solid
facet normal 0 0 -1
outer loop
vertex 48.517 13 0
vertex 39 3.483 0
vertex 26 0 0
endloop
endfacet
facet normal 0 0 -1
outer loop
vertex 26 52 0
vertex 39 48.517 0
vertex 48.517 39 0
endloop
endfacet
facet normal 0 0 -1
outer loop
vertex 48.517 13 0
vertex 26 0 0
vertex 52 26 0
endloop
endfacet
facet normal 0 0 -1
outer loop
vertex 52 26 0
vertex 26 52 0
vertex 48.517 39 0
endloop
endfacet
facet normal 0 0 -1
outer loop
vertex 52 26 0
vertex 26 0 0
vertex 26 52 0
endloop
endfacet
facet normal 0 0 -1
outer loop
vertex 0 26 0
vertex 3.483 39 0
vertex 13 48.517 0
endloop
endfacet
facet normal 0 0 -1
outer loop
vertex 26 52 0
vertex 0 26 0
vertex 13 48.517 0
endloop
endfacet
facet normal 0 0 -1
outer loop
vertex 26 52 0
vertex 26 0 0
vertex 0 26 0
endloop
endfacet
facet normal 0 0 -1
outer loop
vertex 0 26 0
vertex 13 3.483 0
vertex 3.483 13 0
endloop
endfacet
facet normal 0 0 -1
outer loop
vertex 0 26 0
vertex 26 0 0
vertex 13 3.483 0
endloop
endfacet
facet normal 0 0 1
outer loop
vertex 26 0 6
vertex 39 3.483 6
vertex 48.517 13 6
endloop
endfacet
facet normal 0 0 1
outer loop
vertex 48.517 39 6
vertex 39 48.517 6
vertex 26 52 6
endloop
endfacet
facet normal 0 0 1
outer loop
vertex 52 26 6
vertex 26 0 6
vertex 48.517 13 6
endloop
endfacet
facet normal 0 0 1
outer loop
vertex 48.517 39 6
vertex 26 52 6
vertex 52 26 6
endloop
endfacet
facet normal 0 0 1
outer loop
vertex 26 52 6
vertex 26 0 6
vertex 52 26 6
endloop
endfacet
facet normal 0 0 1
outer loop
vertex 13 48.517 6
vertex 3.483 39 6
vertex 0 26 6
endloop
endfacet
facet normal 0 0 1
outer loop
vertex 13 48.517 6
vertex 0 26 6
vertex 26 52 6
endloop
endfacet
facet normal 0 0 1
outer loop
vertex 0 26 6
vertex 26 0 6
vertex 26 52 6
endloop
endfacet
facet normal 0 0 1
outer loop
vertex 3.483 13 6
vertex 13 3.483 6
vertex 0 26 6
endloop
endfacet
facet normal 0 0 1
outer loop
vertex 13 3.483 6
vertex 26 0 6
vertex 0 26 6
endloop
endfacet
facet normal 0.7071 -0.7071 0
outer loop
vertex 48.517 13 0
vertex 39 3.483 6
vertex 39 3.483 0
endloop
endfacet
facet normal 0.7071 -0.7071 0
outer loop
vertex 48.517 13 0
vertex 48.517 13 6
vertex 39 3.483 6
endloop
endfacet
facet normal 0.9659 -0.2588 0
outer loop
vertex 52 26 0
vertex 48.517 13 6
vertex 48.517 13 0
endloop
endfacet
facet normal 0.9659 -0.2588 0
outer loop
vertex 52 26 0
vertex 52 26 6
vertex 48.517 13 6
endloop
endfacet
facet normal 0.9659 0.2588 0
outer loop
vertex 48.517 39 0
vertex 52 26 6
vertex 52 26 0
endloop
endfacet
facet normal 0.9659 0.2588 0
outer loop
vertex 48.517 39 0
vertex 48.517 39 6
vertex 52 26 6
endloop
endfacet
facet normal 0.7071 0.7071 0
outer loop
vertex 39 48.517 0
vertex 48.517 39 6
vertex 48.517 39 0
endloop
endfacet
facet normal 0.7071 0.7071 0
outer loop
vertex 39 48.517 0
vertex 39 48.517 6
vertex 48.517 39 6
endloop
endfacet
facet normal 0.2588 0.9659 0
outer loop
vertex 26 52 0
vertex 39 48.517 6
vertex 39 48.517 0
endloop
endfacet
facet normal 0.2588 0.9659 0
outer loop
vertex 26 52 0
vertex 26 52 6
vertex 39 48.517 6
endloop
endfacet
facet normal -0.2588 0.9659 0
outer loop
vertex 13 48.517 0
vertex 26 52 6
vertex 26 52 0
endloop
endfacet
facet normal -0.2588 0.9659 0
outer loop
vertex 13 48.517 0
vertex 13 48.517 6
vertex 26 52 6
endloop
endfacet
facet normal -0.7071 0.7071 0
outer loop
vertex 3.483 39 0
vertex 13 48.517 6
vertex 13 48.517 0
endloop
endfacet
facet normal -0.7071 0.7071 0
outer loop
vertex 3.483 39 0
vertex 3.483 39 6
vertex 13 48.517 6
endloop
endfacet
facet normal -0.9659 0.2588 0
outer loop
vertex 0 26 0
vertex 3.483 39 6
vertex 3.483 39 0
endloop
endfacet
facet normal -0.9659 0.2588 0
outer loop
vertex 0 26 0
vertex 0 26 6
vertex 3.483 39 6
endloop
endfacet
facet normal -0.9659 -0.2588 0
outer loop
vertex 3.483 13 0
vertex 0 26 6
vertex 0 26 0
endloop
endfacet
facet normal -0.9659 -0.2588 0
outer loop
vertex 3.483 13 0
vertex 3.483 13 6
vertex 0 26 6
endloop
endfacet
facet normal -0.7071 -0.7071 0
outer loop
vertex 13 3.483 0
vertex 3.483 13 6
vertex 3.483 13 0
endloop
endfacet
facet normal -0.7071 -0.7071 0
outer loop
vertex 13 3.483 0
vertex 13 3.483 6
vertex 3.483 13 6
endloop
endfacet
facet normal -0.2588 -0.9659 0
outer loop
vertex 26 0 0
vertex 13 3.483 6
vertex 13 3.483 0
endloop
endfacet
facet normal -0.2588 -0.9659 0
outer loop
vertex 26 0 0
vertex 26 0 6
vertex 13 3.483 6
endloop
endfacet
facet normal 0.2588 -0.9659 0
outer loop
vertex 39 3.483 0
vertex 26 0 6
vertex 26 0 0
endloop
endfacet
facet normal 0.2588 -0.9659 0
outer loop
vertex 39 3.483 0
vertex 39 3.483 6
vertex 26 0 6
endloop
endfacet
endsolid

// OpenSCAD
$fn = 32;

// ----------------------------------------------------------------------
// Eccentric disc: egg, 6 mm thick
// ----------------------------------------------------------------------

// --- parameters (mm) ---
profile_height = 6;       // extrusion height
profile_points = 12;      // points of the closed outline

profile = [[0, 26], [3.483, 13], [13, 3.483], [26, 0], [39, 3.483], [48.517, 13], [52, 26], [48.517, 39], [39, 48.517], [26, 52], [13, 48.517], [3.483, 39]];  // single closed polygon, 12 points, counter clockwise

// --- the one profile operation ---
linear_extrude(height = profile_height) polygon(points = profile);
